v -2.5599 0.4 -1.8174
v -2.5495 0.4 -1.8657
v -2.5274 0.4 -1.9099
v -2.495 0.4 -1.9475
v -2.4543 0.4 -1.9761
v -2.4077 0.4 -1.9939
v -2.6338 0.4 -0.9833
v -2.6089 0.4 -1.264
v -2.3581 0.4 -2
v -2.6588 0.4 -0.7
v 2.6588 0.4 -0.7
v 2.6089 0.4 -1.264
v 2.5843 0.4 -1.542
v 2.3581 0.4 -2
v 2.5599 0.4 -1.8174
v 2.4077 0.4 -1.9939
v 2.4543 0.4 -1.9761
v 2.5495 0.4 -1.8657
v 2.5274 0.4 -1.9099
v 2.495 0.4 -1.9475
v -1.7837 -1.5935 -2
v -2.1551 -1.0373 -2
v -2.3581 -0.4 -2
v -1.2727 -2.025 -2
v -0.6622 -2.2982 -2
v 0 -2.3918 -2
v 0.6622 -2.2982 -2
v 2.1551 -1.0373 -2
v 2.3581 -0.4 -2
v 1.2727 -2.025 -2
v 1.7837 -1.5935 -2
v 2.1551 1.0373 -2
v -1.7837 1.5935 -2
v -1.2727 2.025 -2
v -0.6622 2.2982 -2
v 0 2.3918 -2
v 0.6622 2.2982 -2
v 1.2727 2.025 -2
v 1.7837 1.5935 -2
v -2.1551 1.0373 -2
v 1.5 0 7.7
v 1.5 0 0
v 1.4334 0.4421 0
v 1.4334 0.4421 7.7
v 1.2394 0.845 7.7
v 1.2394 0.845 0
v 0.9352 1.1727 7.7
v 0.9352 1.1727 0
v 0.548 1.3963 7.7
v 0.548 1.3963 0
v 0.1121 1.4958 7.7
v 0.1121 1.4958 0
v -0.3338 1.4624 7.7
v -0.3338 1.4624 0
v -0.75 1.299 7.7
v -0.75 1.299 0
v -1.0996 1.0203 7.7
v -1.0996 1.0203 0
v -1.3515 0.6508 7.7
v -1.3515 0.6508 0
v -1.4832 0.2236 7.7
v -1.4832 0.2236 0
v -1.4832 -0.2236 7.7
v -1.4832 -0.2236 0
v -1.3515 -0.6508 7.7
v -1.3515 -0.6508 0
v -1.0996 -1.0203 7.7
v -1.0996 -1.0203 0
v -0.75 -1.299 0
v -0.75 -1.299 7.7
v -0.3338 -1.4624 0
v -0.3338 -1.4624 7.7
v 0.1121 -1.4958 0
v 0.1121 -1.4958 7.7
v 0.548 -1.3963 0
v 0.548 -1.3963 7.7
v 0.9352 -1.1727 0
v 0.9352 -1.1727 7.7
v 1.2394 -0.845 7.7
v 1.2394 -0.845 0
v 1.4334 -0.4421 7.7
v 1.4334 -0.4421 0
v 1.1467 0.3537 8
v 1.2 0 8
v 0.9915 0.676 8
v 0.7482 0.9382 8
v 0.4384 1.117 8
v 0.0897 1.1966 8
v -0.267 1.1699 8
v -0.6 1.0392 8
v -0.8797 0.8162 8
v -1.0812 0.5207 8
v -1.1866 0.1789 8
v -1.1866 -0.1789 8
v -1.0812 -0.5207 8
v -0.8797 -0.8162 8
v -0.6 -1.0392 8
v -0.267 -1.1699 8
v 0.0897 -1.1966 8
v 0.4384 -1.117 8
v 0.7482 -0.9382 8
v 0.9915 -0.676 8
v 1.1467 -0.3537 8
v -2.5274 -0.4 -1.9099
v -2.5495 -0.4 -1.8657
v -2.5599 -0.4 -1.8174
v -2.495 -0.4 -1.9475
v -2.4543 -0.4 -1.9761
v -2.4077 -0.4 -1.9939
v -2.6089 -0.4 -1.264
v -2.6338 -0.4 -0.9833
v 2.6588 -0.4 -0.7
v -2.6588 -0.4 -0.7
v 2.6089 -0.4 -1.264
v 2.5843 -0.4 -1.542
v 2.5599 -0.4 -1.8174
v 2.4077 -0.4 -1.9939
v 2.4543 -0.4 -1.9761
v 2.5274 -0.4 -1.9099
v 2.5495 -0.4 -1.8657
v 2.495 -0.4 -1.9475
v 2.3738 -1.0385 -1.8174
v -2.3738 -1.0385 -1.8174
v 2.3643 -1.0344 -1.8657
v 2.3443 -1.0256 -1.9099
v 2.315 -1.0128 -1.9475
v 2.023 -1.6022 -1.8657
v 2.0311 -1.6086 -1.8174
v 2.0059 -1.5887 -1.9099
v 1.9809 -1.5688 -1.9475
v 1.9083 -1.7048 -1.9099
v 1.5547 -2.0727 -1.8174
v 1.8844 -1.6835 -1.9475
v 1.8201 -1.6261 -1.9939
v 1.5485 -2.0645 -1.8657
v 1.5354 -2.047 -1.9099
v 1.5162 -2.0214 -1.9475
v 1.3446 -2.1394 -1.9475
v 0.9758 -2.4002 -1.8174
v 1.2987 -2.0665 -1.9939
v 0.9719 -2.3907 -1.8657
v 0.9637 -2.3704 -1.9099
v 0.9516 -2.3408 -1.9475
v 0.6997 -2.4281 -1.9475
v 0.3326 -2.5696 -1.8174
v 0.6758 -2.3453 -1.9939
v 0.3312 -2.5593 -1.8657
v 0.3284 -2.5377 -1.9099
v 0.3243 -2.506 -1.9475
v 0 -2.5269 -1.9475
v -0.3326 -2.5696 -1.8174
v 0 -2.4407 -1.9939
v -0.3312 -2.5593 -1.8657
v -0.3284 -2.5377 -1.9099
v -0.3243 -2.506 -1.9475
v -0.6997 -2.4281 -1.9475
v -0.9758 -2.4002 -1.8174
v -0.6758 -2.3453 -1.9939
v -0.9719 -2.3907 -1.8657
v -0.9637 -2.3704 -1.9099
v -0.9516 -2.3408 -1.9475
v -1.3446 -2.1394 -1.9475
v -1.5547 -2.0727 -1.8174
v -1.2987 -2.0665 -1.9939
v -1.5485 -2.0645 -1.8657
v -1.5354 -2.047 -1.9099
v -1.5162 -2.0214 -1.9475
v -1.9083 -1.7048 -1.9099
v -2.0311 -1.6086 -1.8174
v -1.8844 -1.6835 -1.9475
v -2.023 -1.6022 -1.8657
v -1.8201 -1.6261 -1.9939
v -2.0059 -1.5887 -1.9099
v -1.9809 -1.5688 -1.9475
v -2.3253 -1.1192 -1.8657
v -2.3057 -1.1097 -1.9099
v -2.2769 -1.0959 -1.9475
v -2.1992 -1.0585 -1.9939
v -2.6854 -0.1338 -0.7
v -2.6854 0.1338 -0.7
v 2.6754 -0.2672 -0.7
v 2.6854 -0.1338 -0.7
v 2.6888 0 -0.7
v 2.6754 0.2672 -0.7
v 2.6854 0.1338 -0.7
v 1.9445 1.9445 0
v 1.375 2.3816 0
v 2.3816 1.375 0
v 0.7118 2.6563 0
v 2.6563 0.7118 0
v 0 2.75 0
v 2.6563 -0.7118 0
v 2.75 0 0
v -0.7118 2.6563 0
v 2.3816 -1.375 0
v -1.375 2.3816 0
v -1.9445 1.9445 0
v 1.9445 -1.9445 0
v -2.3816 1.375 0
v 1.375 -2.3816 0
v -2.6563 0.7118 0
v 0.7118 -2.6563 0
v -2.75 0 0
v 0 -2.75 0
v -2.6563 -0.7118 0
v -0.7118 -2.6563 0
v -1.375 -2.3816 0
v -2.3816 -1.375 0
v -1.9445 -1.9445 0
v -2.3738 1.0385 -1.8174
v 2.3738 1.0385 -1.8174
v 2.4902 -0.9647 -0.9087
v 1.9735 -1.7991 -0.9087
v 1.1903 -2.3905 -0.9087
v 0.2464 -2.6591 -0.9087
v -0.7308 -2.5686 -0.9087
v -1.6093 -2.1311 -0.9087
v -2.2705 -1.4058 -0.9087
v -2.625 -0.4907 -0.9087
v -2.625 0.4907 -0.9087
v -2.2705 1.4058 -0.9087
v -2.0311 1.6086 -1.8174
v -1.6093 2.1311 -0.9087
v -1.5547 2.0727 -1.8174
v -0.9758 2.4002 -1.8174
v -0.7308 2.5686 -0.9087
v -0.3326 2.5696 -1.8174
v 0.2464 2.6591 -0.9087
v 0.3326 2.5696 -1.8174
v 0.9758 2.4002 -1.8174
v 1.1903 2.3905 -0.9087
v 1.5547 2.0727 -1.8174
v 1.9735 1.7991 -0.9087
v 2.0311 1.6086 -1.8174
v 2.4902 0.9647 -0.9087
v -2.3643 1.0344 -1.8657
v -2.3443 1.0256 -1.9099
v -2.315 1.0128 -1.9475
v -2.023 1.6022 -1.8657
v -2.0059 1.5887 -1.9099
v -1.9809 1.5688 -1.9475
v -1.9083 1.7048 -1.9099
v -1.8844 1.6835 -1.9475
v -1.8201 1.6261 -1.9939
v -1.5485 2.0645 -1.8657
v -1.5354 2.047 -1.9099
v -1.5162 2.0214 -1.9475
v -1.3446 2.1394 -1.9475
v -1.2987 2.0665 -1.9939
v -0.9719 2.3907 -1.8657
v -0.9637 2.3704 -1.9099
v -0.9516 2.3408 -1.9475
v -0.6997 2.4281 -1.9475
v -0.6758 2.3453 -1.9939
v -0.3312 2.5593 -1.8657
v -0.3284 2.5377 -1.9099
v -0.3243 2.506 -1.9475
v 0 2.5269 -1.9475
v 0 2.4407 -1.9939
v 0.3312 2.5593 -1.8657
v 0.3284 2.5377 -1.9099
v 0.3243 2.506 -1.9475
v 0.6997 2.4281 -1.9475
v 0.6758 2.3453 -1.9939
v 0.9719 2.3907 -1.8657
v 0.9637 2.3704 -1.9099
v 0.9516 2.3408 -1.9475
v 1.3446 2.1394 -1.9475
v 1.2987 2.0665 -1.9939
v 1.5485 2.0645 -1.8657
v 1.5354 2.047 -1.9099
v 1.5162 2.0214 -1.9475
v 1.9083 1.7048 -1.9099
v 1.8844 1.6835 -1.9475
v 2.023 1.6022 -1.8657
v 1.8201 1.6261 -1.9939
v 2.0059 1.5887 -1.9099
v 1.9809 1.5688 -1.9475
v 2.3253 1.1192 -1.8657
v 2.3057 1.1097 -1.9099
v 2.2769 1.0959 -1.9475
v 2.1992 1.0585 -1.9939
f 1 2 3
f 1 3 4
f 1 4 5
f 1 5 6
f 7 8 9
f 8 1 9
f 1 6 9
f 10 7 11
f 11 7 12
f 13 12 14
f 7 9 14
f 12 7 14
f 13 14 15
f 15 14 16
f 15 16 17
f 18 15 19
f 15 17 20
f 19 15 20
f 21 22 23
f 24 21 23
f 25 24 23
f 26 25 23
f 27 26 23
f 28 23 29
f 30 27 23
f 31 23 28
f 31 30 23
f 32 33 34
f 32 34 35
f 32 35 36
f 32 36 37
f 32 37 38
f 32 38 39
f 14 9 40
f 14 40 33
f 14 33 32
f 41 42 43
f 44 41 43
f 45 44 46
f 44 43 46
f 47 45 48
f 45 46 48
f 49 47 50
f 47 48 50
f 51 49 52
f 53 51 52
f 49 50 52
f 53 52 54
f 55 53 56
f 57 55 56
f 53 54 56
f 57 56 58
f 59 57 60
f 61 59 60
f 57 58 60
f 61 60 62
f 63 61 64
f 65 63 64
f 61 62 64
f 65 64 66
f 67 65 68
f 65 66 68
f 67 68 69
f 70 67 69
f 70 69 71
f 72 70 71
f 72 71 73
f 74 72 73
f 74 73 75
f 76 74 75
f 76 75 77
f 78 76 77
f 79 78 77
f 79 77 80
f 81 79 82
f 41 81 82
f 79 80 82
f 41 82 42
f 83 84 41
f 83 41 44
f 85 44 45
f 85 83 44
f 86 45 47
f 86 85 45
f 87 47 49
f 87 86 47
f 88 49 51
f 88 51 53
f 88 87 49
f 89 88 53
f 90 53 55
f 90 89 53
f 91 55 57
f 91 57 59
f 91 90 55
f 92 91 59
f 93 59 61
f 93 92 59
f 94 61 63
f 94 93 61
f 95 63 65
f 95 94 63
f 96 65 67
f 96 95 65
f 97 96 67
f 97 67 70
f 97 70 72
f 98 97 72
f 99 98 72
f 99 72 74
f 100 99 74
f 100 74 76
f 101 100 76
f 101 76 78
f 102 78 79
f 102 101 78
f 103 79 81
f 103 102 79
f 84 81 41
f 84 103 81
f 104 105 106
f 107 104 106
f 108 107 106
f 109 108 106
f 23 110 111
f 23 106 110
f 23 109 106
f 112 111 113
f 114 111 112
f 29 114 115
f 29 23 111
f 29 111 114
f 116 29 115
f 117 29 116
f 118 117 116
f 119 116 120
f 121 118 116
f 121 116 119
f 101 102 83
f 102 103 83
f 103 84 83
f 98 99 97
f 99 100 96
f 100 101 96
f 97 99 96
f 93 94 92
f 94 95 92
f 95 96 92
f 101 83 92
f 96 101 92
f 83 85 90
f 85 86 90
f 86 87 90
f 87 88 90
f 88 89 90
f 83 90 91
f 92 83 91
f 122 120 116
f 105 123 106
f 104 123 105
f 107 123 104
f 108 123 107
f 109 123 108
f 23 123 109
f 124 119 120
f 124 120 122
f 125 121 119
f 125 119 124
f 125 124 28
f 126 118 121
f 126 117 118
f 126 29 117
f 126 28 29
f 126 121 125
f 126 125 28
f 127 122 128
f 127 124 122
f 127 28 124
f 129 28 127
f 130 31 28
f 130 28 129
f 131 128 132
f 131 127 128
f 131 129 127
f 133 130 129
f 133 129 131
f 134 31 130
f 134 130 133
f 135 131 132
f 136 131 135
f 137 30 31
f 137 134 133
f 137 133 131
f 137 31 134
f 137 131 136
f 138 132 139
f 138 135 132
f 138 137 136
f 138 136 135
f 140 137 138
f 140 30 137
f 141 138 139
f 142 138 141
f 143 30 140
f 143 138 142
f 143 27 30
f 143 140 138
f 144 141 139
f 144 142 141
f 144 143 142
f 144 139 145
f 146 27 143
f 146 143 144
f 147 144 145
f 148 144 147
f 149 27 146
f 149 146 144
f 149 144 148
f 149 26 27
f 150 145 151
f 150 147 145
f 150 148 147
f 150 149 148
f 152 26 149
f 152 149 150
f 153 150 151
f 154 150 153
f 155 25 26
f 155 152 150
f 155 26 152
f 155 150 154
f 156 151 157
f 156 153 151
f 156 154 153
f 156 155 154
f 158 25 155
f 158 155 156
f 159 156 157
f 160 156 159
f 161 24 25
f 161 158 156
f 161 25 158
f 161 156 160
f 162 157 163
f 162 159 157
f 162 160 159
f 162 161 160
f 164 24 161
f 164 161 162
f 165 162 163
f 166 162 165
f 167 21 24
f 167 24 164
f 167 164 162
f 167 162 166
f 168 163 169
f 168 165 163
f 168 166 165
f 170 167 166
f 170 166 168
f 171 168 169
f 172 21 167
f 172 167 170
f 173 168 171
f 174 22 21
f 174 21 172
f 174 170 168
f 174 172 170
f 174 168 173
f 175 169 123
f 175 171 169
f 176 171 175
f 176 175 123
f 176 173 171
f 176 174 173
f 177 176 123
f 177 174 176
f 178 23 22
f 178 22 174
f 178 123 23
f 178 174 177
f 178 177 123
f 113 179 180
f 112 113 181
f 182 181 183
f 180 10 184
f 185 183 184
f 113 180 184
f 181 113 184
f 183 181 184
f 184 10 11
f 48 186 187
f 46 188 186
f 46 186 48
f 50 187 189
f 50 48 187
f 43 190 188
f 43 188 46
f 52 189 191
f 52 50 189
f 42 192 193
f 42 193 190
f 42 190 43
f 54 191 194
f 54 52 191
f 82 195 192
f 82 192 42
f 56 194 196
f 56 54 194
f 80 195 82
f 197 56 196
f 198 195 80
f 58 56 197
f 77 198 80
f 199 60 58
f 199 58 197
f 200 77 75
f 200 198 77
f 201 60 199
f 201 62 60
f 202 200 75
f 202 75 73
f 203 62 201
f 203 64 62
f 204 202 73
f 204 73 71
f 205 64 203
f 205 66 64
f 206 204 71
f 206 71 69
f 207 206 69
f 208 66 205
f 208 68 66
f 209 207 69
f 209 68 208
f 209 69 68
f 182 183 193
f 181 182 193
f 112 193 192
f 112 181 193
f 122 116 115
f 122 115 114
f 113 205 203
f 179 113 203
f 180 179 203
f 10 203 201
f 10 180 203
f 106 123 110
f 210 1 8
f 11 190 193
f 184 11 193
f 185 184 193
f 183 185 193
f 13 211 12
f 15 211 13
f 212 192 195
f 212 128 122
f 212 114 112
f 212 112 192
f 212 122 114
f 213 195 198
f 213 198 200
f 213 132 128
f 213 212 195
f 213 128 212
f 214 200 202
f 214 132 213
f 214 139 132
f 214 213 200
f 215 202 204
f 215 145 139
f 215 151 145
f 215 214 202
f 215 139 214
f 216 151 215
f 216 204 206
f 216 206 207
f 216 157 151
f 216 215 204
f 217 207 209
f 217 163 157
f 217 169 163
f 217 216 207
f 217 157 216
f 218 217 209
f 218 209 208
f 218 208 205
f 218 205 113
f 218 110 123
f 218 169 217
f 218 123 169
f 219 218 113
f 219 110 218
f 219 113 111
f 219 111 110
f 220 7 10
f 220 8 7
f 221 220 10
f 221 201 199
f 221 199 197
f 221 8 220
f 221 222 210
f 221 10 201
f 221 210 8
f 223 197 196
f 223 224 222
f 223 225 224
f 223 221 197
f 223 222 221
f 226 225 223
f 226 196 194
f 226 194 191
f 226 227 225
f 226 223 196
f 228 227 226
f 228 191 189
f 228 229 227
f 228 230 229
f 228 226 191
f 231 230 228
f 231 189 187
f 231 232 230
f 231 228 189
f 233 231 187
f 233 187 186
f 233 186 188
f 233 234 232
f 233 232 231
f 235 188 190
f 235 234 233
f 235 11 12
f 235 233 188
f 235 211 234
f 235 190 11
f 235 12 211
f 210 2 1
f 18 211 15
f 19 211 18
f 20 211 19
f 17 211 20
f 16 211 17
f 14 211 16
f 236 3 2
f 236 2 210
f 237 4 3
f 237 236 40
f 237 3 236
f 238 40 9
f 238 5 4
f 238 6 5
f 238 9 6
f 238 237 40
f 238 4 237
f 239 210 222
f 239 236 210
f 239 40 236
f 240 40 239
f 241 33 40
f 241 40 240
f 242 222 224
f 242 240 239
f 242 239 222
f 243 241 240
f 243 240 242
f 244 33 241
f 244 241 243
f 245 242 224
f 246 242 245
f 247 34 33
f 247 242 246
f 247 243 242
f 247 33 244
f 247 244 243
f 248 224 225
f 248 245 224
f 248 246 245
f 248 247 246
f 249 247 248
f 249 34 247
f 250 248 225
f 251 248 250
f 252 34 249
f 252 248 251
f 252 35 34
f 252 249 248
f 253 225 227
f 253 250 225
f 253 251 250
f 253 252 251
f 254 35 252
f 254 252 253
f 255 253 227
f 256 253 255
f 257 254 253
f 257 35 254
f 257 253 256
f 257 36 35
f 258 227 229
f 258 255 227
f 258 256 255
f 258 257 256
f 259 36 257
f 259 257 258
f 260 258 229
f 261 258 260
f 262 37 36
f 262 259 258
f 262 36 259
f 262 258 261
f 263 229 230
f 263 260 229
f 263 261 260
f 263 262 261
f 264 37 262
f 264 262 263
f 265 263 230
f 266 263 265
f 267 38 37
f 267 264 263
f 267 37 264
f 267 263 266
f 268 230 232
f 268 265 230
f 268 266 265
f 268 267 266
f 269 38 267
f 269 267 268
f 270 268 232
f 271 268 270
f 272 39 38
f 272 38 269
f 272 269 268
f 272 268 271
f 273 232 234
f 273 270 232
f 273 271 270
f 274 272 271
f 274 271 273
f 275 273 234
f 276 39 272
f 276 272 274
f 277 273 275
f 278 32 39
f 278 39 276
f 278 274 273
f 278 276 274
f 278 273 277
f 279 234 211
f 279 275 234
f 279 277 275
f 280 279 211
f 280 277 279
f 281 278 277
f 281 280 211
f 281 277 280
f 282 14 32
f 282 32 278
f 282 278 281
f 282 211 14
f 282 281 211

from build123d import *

# Parameters (mm, degrees)
ESQUISSE2_W             = 5.5
ESQUISSE2_H             = 0.8
ENLEV_MAT_EXTRU_1_DEPTH = 1.3
ESQUISSE3_W             = 1.5
ESQUISSE3_H             = 8
CHANFREIN1_SIZE         = 0.3


with BuildPart() as part:
    # Esquisse1 → Base-Révolution (revolve)
    with BuildSketch(Plane(origin=(0, 0, 0), x_dir=(1, 0, 0), z_dir=(0, 1, 0))):
        with BuildLine():
            Line((0, 0), (2.75, 0))
            Line((2.75, 0), (2.590995378, 1.817431149))
            ThreePointArc((2.590995378, 1.817431149), (2.52687448, 1.947455467), (2.391756438, 2))
            Line((2.391756438, 2), (0, 2))
            Line((0, 2), (0, 0))
        make_face()
    revolve(axis=Axis((0, 0, 0), (0, 0, -1)))

    # Esquisse2 → Enlev. mat.-Extru.1 (cut)
    with BuildSketch(Plane.XY.offset(-2)):
        Rectangle(ESQUISSE2_W, ESQUISSE2_H)
    extrude(amount=ENLEV_MAT_EXTRU_1_DEPTH, mode=Mode.SUBTRACT)

    # Esquisse3 → Boss.-Révol.1 (revolve)
    with BuildSketch(Plane(origin=(0, 0, 0), x_dir=(1, 0, 0), z_dir=(0, 1, 0))):
        with Locations((0.75, -4)):
            Rectangle(ESQUISSE3_W, ESQUISSE3_H)
    revolve(axis=Axis((0, 0, 0), (0, 0, 1)))

    # Chanfrein1
    chanfrein1_edges = [part.edges().sort_by_distance(p)[0] for p in [
        (-1.5, 0, 8),
    ]]
    chamfer(chanfrein1_edges, length=CHANFREIN1_SIZE)


solid = part.part
